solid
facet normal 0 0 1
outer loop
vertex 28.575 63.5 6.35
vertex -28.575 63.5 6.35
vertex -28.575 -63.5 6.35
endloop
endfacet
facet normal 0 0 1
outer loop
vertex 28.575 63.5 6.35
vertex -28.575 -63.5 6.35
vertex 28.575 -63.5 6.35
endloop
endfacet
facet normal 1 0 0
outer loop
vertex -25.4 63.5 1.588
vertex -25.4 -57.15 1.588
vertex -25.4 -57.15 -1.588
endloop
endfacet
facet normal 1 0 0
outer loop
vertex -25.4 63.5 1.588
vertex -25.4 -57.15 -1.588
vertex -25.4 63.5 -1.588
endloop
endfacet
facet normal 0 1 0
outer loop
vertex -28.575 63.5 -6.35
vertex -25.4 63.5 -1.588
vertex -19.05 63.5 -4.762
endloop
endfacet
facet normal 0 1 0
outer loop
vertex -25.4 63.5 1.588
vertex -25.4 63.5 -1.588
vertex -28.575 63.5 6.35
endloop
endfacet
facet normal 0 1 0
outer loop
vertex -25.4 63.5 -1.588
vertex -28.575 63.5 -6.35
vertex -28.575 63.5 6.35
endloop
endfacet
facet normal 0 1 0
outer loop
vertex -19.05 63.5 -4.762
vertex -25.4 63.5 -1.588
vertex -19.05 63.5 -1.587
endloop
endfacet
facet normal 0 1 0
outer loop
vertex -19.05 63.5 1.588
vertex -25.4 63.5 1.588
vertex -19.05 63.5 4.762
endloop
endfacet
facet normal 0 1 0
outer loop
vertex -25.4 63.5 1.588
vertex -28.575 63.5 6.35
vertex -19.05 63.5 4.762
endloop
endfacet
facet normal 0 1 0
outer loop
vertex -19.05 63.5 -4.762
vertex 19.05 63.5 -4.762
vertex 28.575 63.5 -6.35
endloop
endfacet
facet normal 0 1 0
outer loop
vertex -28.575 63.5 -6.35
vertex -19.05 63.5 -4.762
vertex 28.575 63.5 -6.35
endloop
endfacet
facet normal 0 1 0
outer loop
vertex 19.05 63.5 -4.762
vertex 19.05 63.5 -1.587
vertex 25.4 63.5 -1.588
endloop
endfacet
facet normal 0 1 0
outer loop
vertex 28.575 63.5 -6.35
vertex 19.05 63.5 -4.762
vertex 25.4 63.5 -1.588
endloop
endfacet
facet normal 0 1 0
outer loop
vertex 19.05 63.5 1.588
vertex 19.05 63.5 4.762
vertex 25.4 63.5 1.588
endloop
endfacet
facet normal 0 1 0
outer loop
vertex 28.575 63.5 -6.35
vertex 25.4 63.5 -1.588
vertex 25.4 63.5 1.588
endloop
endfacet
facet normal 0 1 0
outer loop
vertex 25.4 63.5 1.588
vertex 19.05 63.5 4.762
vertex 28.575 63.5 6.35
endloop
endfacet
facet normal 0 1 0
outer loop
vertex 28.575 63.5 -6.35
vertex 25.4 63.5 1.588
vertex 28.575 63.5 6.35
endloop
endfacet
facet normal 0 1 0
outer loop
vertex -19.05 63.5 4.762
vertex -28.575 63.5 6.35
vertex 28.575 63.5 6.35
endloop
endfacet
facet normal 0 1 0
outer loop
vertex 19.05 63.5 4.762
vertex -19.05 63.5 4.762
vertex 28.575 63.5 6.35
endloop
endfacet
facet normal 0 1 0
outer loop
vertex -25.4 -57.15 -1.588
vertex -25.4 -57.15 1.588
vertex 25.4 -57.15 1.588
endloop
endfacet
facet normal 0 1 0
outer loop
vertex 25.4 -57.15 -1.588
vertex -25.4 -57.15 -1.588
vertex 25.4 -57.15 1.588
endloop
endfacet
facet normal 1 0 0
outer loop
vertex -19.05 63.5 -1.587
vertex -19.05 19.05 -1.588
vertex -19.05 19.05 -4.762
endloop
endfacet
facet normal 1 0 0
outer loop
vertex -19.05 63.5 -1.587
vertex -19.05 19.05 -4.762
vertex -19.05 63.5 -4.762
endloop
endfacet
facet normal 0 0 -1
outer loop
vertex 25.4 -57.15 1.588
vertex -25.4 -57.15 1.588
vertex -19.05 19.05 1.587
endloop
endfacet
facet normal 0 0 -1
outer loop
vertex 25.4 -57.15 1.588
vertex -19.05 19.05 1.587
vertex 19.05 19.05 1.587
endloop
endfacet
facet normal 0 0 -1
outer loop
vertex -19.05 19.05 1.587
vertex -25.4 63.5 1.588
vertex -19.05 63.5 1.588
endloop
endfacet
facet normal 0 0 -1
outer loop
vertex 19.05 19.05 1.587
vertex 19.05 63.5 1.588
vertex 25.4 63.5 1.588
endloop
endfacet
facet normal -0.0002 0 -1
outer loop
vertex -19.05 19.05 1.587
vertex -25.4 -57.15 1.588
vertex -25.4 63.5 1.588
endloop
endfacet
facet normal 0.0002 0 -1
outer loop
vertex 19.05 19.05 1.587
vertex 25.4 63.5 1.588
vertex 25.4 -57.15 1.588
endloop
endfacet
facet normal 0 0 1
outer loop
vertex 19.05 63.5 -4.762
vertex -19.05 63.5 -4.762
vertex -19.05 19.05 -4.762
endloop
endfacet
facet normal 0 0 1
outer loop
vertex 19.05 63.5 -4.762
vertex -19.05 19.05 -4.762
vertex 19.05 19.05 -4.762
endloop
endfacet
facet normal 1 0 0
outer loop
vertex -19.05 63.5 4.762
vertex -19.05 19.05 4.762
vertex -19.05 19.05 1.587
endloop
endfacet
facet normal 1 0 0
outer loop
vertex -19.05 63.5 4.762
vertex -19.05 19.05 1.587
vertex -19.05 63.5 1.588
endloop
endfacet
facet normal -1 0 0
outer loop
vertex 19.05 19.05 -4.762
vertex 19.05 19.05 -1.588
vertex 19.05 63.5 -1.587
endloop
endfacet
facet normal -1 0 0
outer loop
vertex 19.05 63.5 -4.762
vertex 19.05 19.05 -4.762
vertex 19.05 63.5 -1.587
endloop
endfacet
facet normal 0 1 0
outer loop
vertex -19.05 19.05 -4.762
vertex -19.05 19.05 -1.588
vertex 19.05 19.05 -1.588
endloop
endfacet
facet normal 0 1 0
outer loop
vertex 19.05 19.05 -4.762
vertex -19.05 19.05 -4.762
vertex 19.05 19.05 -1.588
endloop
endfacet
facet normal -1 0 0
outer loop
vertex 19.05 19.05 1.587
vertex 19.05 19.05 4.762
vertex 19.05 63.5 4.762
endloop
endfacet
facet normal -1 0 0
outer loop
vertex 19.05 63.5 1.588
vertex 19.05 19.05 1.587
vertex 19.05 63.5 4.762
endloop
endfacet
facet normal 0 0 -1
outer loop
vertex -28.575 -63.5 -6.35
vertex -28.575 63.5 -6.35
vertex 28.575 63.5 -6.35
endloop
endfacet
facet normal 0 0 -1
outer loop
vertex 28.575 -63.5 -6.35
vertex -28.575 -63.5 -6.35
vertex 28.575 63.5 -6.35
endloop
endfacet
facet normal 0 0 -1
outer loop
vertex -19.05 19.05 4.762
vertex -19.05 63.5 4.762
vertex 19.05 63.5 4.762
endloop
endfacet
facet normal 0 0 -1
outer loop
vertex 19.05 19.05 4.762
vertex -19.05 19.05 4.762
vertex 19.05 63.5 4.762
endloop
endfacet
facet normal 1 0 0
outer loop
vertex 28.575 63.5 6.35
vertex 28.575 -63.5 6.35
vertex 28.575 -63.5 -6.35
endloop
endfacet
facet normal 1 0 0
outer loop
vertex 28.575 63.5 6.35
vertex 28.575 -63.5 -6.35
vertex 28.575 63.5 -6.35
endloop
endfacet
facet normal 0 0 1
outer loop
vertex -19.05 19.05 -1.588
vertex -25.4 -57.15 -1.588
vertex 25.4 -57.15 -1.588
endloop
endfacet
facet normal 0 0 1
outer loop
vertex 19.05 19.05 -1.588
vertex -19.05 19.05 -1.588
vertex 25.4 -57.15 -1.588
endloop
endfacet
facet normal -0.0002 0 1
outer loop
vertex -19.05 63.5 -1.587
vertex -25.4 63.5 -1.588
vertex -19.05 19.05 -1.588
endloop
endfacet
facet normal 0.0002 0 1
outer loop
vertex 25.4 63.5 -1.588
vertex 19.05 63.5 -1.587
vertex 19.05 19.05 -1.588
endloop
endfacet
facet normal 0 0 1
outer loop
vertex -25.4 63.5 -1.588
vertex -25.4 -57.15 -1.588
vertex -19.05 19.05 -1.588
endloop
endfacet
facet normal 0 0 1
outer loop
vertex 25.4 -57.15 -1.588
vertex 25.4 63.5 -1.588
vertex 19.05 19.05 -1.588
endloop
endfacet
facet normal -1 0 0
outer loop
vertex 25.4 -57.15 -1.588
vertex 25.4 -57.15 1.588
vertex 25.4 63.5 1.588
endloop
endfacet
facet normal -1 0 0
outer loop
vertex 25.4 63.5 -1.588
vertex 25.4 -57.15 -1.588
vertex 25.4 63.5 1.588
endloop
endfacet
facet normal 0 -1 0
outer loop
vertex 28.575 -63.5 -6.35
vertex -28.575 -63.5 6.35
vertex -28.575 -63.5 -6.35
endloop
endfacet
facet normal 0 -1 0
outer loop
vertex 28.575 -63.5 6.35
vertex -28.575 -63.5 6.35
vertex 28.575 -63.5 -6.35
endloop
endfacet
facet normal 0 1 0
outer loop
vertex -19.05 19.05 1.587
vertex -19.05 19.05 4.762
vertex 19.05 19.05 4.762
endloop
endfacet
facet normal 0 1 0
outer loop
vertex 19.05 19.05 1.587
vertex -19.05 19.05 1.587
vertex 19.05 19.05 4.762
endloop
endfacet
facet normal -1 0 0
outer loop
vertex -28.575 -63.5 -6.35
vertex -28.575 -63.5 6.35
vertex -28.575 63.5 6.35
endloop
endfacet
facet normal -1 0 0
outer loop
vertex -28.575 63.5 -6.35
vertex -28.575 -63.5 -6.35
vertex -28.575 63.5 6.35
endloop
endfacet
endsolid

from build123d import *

# Parameters (mm, degrees)
SKETCH1_W           = 57.15
SKETCH1_H           = 127
BOSS_EXTRUDE1_DEPTH = 6.35
SKETCH2_W           = 50.8
SKETCH2_H           = 120.65
CUT_EXTRUDE1_DEPTH  = 1.5875
SKETCH3_W           = 38.1
SKETCH3_H           = 44.45
CUT_EXTRUDE2_DEPTH  = 4.7625


with BuildPart() as part:
    # Sketch1 → Boss-Extrude1 (new, symmetric)
    with BuildSketch(Plane.XY):
        Rectangle(SKETCH1_W, SKETCH1_H)
    extrude(amount=BOSS_EXTRUDE1_DEPTH, both=True)

    # Sketch2 → Cut-Extrude1 (cut, symmetric)
    with BuildSketch(Plane.XY):
        with Locations((0, 3.175)):
            Rectangle(SKETCH2_W, SKETCH2_H)
    extrude(amount=CUT_EXTRUDE1_DEPTH, both=True, mode=Mode.SUBTRACT)

    # Sketch3 → Cut-Extrude2 (cut, symmetric)
    with BuildSketch(Plane.XY):
        with Locations((0, 41.275)):
            Rectangle(SKETCH3_W, SKETCH3_H)
    extrude(amount=CUT_EXTRUDE2_DEPTH, both=True, mode=Mode.SUBTRACT)


solid = part.part
